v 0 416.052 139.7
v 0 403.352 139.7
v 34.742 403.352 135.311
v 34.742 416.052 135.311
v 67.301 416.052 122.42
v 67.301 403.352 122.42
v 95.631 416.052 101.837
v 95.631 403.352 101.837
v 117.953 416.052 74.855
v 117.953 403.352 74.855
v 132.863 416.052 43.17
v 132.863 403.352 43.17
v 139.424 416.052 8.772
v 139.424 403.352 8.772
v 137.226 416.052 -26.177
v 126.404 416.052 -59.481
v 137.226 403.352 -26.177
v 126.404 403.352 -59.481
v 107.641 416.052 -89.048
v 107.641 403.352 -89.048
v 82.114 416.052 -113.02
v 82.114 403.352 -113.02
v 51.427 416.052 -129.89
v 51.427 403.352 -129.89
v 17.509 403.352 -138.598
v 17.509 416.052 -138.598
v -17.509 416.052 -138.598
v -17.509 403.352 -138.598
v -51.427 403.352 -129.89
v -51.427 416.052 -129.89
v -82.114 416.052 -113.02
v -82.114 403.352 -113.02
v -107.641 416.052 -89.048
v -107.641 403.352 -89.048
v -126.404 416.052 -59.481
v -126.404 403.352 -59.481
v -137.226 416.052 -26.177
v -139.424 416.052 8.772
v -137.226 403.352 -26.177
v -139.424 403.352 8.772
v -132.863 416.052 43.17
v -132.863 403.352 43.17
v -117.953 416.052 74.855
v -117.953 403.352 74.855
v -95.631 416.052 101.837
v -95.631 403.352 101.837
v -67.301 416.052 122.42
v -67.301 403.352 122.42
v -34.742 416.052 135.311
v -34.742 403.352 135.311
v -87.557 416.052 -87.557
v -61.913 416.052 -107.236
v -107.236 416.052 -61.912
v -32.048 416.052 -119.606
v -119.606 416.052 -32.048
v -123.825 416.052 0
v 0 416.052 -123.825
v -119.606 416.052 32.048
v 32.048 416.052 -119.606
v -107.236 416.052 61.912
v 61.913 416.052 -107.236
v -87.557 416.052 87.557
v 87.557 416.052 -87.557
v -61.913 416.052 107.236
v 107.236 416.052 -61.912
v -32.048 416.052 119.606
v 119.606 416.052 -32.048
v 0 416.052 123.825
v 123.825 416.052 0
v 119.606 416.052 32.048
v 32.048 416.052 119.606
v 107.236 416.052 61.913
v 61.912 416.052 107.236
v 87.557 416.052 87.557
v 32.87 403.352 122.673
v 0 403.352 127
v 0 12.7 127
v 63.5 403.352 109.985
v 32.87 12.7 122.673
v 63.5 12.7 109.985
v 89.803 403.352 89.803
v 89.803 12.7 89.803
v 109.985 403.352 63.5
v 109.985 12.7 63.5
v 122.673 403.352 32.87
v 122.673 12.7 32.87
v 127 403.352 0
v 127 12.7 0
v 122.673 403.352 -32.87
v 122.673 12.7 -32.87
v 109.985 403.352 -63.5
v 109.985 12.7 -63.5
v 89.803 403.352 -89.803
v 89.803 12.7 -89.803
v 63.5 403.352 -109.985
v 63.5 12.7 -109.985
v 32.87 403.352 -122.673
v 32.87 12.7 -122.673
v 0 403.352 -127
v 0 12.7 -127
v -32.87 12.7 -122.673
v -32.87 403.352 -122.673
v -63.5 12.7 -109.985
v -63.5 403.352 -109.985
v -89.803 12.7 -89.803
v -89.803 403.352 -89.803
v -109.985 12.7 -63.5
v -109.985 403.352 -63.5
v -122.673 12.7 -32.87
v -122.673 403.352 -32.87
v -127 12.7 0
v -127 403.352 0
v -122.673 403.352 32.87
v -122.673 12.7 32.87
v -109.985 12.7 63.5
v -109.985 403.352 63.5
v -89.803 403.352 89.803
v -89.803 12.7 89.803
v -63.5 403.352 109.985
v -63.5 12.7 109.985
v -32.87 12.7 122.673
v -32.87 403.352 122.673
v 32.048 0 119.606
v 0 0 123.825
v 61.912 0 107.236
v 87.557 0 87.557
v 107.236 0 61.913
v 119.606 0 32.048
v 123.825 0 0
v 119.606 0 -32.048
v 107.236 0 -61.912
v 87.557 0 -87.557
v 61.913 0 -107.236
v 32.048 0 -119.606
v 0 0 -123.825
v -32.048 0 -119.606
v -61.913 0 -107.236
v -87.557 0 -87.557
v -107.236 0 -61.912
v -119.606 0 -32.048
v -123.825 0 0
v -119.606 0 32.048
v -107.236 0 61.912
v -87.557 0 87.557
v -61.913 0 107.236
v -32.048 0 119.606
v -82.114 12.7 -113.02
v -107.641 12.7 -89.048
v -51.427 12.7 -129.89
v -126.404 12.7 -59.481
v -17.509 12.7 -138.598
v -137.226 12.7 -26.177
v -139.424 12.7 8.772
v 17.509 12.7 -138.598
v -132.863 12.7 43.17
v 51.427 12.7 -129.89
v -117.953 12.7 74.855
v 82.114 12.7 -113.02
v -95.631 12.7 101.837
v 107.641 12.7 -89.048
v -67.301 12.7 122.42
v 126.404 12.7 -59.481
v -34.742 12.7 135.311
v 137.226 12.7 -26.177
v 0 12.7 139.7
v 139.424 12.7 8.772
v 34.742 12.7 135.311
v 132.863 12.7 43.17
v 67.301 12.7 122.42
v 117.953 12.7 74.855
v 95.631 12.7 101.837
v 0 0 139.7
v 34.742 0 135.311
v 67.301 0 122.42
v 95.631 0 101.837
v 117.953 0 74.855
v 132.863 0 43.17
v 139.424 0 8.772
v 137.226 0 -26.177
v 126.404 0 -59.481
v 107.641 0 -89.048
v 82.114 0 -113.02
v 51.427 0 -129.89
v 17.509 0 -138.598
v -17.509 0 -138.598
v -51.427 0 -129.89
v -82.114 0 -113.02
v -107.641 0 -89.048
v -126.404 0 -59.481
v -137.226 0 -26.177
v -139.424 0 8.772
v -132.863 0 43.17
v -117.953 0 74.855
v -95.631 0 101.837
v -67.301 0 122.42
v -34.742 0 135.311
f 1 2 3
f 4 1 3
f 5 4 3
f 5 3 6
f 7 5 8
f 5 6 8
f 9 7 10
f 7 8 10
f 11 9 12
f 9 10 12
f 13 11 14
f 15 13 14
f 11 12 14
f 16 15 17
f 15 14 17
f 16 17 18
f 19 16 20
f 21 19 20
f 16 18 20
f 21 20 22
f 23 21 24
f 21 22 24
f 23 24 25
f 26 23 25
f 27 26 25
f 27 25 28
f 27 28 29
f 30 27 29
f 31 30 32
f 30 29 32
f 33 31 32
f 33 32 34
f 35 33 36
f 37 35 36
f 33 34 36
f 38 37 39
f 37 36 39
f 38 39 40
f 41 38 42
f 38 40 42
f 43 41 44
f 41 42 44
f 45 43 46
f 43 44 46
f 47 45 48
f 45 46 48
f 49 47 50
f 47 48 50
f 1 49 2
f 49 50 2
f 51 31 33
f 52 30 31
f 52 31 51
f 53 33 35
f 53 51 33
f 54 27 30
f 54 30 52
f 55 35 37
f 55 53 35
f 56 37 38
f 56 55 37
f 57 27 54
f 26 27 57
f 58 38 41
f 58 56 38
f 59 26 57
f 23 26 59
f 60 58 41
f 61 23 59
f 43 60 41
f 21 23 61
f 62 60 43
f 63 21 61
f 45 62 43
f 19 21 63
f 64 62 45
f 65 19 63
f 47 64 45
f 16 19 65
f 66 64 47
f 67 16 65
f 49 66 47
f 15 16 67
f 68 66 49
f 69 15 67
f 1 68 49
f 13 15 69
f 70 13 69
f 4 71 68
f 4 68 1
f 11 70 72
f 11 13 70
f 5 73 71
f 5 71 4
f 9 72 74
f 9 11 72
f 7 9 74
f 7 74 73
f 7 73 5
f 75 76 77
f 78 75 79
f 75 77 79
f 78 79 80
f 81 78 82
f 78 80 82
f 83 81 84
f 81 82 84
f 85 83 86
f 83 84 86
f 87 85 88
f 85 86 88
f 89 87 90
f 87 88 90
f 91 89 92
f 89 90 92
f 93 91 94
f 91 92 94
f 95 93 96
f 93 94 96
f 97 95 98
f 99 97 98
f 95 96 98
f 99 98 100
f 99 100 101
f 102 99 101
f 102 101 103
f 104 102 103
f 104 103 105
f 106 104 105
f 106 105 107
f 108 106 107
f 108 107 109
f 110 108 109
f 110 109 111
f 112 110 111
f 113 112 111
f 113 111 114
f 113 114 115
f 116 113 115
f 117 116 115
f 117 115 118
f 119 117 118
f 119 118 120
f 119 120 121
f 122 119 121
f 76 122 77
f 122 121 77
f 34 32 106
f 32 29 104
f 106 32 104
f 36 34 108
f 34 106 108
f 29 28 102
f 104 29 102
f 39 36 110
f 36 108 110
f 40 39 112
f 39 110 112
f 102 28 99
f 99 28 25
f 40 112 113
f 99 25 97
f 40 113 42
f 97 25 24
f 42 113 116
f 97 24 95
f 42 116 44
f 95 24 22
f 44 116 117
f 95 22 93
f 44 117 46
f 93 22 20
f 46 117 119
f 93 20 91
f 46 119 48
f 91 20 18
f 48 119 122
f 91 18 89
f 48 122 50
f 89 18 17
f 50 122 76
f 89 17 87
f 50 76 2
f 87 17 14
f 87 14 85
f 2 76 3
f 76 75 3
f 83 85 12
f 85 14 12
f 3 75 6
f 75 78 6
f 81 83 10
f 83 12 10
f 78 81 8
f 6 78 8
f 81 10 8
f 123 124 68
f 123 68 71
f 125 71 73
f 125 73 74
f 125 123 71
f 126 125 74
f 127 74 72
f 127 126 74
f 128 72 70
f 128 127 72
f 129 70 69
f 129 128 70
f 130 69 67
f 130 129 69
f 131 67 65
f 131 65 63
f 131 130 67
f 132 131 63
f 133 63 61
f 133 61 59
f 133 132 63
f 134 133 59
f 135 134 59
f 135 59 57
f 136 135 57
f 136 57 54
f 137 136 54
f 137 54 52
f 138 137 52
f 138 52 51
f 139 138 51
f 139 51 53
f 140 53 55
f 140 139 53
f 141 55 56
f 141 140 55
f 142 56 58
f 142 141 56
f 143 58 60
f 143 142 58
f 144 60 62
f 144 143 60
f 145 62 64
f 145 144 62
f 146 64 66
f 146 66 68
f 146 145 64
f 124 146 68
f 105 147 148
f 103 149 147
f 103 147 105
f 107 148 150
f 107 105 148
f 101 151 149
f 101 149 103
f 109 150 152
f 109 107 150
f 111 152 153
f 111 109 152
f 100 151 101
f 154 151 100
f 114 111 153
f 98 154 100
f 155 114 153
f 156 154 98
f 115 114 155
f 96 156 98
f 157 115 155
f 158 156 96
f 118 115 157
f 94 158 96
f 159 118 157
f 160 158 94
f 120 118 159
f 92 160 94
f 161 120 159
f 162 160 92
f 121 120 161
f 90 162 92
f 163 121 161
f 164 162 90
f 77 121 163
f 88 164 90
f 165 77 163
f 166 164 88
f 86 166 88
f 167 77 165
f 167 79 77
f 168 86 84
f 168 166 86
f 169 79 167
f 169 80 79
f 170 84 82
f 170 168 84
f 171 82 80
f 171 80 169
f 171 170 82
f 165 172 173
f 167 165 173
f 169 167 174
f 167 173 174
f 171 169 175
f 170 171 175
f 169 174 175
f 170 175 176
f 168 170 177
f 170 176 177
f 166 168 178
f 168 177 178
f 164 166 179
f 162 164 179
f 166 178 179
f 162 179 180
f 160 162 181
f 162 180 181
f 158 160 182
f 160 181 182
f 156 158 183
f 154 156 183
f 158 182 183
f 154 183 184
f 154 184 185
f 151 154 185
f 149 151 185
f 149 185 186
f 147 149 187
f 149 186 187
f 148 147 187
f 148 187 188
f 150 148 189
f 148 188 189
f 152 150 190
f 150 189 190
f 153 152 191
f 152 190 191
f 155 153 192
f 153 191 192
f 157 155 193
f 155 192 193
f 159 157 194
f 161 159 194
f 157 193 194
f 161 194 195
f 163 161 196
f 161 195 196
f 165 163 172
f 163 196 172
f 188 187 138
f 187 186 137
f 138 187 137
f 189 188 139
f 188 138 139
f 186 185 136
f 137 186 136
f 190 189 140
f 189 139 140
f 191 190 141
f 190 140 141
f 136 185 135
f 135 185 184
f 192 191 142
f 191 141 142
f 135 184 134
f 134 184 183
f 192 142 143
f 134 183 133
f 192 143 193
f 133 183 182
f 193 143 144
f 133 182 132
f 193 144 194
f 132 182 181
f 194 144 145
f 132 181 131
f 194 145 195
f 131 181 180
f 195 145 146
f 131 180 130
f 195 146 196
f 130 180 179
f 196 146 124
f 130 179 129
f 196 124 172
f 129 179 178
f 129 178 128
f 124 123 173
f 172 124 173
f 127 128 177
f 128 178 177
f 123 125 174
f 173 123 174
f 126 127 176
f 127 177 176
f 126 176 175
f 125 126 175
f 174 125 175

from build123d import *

# Parameters (mm, degrees)
SKETCH1_R           = 127
SKETCH1_R_2         = 123.825
BOSS_EXTRUDE1_DEPTH = 416.052
SKETCH1_3_R         = 139.7
SKETCH1_3_R_2       = 127
BOSS_EXTRUDE2_DEPTH = 12.7
BOSS_EXTRUDE4_START = 403.352
SKETCH1_5_R         = 139.7
SKETCH1_5_R_2       = 127
BOSS_EXTRUDE4_DEPTH = 12.7


with BuildPart() as part:
    # Sketch1 → Boss-Extrude1 (new body)
    with BuildSketch(Plane(origin=(0, 0, 0), x_dir=(1, 0, 0), z_dir=(0, 1, 0))):
        Circle(SKETCH1_R)
        Circle(SKETCH1_R_2, mode=Mode.SUBTRACT)
    extrude(amount=BOSS_EXTRUDE1_DEPTH)

    # Sketch1<3> → Boss-Extrude2 (add)
    with BuildSketch(Plane(origin=(0, 0, 0), x_dir=(1, 0, 0), z_dir=(0, 1, 0))):
        Circle(SKETCH1_3_R)
        Circle(SKETCH1_3_R_2, mode=Mode.SUBTRACT)
    extrude(amount=BOSS_EXTRUDE2_DEPTH)

    # Sketch1<5> → Boss-Extrude4 (add)
    with BuildSketch(Plane(origin=(0, 0, 0), x_dir=(1, 0, 0), z_dir=(0, 1, 0)).offset(BOSS_EXTRUDE4_START)):
        Circle(SKETCH1_5_R)
        Circle(SKETCH1_5_R_2, mode=Mode.SUBTRACT)
    extrude(amount=BOSS_EXTRUDE4_DEPTH)


solid = part.part
